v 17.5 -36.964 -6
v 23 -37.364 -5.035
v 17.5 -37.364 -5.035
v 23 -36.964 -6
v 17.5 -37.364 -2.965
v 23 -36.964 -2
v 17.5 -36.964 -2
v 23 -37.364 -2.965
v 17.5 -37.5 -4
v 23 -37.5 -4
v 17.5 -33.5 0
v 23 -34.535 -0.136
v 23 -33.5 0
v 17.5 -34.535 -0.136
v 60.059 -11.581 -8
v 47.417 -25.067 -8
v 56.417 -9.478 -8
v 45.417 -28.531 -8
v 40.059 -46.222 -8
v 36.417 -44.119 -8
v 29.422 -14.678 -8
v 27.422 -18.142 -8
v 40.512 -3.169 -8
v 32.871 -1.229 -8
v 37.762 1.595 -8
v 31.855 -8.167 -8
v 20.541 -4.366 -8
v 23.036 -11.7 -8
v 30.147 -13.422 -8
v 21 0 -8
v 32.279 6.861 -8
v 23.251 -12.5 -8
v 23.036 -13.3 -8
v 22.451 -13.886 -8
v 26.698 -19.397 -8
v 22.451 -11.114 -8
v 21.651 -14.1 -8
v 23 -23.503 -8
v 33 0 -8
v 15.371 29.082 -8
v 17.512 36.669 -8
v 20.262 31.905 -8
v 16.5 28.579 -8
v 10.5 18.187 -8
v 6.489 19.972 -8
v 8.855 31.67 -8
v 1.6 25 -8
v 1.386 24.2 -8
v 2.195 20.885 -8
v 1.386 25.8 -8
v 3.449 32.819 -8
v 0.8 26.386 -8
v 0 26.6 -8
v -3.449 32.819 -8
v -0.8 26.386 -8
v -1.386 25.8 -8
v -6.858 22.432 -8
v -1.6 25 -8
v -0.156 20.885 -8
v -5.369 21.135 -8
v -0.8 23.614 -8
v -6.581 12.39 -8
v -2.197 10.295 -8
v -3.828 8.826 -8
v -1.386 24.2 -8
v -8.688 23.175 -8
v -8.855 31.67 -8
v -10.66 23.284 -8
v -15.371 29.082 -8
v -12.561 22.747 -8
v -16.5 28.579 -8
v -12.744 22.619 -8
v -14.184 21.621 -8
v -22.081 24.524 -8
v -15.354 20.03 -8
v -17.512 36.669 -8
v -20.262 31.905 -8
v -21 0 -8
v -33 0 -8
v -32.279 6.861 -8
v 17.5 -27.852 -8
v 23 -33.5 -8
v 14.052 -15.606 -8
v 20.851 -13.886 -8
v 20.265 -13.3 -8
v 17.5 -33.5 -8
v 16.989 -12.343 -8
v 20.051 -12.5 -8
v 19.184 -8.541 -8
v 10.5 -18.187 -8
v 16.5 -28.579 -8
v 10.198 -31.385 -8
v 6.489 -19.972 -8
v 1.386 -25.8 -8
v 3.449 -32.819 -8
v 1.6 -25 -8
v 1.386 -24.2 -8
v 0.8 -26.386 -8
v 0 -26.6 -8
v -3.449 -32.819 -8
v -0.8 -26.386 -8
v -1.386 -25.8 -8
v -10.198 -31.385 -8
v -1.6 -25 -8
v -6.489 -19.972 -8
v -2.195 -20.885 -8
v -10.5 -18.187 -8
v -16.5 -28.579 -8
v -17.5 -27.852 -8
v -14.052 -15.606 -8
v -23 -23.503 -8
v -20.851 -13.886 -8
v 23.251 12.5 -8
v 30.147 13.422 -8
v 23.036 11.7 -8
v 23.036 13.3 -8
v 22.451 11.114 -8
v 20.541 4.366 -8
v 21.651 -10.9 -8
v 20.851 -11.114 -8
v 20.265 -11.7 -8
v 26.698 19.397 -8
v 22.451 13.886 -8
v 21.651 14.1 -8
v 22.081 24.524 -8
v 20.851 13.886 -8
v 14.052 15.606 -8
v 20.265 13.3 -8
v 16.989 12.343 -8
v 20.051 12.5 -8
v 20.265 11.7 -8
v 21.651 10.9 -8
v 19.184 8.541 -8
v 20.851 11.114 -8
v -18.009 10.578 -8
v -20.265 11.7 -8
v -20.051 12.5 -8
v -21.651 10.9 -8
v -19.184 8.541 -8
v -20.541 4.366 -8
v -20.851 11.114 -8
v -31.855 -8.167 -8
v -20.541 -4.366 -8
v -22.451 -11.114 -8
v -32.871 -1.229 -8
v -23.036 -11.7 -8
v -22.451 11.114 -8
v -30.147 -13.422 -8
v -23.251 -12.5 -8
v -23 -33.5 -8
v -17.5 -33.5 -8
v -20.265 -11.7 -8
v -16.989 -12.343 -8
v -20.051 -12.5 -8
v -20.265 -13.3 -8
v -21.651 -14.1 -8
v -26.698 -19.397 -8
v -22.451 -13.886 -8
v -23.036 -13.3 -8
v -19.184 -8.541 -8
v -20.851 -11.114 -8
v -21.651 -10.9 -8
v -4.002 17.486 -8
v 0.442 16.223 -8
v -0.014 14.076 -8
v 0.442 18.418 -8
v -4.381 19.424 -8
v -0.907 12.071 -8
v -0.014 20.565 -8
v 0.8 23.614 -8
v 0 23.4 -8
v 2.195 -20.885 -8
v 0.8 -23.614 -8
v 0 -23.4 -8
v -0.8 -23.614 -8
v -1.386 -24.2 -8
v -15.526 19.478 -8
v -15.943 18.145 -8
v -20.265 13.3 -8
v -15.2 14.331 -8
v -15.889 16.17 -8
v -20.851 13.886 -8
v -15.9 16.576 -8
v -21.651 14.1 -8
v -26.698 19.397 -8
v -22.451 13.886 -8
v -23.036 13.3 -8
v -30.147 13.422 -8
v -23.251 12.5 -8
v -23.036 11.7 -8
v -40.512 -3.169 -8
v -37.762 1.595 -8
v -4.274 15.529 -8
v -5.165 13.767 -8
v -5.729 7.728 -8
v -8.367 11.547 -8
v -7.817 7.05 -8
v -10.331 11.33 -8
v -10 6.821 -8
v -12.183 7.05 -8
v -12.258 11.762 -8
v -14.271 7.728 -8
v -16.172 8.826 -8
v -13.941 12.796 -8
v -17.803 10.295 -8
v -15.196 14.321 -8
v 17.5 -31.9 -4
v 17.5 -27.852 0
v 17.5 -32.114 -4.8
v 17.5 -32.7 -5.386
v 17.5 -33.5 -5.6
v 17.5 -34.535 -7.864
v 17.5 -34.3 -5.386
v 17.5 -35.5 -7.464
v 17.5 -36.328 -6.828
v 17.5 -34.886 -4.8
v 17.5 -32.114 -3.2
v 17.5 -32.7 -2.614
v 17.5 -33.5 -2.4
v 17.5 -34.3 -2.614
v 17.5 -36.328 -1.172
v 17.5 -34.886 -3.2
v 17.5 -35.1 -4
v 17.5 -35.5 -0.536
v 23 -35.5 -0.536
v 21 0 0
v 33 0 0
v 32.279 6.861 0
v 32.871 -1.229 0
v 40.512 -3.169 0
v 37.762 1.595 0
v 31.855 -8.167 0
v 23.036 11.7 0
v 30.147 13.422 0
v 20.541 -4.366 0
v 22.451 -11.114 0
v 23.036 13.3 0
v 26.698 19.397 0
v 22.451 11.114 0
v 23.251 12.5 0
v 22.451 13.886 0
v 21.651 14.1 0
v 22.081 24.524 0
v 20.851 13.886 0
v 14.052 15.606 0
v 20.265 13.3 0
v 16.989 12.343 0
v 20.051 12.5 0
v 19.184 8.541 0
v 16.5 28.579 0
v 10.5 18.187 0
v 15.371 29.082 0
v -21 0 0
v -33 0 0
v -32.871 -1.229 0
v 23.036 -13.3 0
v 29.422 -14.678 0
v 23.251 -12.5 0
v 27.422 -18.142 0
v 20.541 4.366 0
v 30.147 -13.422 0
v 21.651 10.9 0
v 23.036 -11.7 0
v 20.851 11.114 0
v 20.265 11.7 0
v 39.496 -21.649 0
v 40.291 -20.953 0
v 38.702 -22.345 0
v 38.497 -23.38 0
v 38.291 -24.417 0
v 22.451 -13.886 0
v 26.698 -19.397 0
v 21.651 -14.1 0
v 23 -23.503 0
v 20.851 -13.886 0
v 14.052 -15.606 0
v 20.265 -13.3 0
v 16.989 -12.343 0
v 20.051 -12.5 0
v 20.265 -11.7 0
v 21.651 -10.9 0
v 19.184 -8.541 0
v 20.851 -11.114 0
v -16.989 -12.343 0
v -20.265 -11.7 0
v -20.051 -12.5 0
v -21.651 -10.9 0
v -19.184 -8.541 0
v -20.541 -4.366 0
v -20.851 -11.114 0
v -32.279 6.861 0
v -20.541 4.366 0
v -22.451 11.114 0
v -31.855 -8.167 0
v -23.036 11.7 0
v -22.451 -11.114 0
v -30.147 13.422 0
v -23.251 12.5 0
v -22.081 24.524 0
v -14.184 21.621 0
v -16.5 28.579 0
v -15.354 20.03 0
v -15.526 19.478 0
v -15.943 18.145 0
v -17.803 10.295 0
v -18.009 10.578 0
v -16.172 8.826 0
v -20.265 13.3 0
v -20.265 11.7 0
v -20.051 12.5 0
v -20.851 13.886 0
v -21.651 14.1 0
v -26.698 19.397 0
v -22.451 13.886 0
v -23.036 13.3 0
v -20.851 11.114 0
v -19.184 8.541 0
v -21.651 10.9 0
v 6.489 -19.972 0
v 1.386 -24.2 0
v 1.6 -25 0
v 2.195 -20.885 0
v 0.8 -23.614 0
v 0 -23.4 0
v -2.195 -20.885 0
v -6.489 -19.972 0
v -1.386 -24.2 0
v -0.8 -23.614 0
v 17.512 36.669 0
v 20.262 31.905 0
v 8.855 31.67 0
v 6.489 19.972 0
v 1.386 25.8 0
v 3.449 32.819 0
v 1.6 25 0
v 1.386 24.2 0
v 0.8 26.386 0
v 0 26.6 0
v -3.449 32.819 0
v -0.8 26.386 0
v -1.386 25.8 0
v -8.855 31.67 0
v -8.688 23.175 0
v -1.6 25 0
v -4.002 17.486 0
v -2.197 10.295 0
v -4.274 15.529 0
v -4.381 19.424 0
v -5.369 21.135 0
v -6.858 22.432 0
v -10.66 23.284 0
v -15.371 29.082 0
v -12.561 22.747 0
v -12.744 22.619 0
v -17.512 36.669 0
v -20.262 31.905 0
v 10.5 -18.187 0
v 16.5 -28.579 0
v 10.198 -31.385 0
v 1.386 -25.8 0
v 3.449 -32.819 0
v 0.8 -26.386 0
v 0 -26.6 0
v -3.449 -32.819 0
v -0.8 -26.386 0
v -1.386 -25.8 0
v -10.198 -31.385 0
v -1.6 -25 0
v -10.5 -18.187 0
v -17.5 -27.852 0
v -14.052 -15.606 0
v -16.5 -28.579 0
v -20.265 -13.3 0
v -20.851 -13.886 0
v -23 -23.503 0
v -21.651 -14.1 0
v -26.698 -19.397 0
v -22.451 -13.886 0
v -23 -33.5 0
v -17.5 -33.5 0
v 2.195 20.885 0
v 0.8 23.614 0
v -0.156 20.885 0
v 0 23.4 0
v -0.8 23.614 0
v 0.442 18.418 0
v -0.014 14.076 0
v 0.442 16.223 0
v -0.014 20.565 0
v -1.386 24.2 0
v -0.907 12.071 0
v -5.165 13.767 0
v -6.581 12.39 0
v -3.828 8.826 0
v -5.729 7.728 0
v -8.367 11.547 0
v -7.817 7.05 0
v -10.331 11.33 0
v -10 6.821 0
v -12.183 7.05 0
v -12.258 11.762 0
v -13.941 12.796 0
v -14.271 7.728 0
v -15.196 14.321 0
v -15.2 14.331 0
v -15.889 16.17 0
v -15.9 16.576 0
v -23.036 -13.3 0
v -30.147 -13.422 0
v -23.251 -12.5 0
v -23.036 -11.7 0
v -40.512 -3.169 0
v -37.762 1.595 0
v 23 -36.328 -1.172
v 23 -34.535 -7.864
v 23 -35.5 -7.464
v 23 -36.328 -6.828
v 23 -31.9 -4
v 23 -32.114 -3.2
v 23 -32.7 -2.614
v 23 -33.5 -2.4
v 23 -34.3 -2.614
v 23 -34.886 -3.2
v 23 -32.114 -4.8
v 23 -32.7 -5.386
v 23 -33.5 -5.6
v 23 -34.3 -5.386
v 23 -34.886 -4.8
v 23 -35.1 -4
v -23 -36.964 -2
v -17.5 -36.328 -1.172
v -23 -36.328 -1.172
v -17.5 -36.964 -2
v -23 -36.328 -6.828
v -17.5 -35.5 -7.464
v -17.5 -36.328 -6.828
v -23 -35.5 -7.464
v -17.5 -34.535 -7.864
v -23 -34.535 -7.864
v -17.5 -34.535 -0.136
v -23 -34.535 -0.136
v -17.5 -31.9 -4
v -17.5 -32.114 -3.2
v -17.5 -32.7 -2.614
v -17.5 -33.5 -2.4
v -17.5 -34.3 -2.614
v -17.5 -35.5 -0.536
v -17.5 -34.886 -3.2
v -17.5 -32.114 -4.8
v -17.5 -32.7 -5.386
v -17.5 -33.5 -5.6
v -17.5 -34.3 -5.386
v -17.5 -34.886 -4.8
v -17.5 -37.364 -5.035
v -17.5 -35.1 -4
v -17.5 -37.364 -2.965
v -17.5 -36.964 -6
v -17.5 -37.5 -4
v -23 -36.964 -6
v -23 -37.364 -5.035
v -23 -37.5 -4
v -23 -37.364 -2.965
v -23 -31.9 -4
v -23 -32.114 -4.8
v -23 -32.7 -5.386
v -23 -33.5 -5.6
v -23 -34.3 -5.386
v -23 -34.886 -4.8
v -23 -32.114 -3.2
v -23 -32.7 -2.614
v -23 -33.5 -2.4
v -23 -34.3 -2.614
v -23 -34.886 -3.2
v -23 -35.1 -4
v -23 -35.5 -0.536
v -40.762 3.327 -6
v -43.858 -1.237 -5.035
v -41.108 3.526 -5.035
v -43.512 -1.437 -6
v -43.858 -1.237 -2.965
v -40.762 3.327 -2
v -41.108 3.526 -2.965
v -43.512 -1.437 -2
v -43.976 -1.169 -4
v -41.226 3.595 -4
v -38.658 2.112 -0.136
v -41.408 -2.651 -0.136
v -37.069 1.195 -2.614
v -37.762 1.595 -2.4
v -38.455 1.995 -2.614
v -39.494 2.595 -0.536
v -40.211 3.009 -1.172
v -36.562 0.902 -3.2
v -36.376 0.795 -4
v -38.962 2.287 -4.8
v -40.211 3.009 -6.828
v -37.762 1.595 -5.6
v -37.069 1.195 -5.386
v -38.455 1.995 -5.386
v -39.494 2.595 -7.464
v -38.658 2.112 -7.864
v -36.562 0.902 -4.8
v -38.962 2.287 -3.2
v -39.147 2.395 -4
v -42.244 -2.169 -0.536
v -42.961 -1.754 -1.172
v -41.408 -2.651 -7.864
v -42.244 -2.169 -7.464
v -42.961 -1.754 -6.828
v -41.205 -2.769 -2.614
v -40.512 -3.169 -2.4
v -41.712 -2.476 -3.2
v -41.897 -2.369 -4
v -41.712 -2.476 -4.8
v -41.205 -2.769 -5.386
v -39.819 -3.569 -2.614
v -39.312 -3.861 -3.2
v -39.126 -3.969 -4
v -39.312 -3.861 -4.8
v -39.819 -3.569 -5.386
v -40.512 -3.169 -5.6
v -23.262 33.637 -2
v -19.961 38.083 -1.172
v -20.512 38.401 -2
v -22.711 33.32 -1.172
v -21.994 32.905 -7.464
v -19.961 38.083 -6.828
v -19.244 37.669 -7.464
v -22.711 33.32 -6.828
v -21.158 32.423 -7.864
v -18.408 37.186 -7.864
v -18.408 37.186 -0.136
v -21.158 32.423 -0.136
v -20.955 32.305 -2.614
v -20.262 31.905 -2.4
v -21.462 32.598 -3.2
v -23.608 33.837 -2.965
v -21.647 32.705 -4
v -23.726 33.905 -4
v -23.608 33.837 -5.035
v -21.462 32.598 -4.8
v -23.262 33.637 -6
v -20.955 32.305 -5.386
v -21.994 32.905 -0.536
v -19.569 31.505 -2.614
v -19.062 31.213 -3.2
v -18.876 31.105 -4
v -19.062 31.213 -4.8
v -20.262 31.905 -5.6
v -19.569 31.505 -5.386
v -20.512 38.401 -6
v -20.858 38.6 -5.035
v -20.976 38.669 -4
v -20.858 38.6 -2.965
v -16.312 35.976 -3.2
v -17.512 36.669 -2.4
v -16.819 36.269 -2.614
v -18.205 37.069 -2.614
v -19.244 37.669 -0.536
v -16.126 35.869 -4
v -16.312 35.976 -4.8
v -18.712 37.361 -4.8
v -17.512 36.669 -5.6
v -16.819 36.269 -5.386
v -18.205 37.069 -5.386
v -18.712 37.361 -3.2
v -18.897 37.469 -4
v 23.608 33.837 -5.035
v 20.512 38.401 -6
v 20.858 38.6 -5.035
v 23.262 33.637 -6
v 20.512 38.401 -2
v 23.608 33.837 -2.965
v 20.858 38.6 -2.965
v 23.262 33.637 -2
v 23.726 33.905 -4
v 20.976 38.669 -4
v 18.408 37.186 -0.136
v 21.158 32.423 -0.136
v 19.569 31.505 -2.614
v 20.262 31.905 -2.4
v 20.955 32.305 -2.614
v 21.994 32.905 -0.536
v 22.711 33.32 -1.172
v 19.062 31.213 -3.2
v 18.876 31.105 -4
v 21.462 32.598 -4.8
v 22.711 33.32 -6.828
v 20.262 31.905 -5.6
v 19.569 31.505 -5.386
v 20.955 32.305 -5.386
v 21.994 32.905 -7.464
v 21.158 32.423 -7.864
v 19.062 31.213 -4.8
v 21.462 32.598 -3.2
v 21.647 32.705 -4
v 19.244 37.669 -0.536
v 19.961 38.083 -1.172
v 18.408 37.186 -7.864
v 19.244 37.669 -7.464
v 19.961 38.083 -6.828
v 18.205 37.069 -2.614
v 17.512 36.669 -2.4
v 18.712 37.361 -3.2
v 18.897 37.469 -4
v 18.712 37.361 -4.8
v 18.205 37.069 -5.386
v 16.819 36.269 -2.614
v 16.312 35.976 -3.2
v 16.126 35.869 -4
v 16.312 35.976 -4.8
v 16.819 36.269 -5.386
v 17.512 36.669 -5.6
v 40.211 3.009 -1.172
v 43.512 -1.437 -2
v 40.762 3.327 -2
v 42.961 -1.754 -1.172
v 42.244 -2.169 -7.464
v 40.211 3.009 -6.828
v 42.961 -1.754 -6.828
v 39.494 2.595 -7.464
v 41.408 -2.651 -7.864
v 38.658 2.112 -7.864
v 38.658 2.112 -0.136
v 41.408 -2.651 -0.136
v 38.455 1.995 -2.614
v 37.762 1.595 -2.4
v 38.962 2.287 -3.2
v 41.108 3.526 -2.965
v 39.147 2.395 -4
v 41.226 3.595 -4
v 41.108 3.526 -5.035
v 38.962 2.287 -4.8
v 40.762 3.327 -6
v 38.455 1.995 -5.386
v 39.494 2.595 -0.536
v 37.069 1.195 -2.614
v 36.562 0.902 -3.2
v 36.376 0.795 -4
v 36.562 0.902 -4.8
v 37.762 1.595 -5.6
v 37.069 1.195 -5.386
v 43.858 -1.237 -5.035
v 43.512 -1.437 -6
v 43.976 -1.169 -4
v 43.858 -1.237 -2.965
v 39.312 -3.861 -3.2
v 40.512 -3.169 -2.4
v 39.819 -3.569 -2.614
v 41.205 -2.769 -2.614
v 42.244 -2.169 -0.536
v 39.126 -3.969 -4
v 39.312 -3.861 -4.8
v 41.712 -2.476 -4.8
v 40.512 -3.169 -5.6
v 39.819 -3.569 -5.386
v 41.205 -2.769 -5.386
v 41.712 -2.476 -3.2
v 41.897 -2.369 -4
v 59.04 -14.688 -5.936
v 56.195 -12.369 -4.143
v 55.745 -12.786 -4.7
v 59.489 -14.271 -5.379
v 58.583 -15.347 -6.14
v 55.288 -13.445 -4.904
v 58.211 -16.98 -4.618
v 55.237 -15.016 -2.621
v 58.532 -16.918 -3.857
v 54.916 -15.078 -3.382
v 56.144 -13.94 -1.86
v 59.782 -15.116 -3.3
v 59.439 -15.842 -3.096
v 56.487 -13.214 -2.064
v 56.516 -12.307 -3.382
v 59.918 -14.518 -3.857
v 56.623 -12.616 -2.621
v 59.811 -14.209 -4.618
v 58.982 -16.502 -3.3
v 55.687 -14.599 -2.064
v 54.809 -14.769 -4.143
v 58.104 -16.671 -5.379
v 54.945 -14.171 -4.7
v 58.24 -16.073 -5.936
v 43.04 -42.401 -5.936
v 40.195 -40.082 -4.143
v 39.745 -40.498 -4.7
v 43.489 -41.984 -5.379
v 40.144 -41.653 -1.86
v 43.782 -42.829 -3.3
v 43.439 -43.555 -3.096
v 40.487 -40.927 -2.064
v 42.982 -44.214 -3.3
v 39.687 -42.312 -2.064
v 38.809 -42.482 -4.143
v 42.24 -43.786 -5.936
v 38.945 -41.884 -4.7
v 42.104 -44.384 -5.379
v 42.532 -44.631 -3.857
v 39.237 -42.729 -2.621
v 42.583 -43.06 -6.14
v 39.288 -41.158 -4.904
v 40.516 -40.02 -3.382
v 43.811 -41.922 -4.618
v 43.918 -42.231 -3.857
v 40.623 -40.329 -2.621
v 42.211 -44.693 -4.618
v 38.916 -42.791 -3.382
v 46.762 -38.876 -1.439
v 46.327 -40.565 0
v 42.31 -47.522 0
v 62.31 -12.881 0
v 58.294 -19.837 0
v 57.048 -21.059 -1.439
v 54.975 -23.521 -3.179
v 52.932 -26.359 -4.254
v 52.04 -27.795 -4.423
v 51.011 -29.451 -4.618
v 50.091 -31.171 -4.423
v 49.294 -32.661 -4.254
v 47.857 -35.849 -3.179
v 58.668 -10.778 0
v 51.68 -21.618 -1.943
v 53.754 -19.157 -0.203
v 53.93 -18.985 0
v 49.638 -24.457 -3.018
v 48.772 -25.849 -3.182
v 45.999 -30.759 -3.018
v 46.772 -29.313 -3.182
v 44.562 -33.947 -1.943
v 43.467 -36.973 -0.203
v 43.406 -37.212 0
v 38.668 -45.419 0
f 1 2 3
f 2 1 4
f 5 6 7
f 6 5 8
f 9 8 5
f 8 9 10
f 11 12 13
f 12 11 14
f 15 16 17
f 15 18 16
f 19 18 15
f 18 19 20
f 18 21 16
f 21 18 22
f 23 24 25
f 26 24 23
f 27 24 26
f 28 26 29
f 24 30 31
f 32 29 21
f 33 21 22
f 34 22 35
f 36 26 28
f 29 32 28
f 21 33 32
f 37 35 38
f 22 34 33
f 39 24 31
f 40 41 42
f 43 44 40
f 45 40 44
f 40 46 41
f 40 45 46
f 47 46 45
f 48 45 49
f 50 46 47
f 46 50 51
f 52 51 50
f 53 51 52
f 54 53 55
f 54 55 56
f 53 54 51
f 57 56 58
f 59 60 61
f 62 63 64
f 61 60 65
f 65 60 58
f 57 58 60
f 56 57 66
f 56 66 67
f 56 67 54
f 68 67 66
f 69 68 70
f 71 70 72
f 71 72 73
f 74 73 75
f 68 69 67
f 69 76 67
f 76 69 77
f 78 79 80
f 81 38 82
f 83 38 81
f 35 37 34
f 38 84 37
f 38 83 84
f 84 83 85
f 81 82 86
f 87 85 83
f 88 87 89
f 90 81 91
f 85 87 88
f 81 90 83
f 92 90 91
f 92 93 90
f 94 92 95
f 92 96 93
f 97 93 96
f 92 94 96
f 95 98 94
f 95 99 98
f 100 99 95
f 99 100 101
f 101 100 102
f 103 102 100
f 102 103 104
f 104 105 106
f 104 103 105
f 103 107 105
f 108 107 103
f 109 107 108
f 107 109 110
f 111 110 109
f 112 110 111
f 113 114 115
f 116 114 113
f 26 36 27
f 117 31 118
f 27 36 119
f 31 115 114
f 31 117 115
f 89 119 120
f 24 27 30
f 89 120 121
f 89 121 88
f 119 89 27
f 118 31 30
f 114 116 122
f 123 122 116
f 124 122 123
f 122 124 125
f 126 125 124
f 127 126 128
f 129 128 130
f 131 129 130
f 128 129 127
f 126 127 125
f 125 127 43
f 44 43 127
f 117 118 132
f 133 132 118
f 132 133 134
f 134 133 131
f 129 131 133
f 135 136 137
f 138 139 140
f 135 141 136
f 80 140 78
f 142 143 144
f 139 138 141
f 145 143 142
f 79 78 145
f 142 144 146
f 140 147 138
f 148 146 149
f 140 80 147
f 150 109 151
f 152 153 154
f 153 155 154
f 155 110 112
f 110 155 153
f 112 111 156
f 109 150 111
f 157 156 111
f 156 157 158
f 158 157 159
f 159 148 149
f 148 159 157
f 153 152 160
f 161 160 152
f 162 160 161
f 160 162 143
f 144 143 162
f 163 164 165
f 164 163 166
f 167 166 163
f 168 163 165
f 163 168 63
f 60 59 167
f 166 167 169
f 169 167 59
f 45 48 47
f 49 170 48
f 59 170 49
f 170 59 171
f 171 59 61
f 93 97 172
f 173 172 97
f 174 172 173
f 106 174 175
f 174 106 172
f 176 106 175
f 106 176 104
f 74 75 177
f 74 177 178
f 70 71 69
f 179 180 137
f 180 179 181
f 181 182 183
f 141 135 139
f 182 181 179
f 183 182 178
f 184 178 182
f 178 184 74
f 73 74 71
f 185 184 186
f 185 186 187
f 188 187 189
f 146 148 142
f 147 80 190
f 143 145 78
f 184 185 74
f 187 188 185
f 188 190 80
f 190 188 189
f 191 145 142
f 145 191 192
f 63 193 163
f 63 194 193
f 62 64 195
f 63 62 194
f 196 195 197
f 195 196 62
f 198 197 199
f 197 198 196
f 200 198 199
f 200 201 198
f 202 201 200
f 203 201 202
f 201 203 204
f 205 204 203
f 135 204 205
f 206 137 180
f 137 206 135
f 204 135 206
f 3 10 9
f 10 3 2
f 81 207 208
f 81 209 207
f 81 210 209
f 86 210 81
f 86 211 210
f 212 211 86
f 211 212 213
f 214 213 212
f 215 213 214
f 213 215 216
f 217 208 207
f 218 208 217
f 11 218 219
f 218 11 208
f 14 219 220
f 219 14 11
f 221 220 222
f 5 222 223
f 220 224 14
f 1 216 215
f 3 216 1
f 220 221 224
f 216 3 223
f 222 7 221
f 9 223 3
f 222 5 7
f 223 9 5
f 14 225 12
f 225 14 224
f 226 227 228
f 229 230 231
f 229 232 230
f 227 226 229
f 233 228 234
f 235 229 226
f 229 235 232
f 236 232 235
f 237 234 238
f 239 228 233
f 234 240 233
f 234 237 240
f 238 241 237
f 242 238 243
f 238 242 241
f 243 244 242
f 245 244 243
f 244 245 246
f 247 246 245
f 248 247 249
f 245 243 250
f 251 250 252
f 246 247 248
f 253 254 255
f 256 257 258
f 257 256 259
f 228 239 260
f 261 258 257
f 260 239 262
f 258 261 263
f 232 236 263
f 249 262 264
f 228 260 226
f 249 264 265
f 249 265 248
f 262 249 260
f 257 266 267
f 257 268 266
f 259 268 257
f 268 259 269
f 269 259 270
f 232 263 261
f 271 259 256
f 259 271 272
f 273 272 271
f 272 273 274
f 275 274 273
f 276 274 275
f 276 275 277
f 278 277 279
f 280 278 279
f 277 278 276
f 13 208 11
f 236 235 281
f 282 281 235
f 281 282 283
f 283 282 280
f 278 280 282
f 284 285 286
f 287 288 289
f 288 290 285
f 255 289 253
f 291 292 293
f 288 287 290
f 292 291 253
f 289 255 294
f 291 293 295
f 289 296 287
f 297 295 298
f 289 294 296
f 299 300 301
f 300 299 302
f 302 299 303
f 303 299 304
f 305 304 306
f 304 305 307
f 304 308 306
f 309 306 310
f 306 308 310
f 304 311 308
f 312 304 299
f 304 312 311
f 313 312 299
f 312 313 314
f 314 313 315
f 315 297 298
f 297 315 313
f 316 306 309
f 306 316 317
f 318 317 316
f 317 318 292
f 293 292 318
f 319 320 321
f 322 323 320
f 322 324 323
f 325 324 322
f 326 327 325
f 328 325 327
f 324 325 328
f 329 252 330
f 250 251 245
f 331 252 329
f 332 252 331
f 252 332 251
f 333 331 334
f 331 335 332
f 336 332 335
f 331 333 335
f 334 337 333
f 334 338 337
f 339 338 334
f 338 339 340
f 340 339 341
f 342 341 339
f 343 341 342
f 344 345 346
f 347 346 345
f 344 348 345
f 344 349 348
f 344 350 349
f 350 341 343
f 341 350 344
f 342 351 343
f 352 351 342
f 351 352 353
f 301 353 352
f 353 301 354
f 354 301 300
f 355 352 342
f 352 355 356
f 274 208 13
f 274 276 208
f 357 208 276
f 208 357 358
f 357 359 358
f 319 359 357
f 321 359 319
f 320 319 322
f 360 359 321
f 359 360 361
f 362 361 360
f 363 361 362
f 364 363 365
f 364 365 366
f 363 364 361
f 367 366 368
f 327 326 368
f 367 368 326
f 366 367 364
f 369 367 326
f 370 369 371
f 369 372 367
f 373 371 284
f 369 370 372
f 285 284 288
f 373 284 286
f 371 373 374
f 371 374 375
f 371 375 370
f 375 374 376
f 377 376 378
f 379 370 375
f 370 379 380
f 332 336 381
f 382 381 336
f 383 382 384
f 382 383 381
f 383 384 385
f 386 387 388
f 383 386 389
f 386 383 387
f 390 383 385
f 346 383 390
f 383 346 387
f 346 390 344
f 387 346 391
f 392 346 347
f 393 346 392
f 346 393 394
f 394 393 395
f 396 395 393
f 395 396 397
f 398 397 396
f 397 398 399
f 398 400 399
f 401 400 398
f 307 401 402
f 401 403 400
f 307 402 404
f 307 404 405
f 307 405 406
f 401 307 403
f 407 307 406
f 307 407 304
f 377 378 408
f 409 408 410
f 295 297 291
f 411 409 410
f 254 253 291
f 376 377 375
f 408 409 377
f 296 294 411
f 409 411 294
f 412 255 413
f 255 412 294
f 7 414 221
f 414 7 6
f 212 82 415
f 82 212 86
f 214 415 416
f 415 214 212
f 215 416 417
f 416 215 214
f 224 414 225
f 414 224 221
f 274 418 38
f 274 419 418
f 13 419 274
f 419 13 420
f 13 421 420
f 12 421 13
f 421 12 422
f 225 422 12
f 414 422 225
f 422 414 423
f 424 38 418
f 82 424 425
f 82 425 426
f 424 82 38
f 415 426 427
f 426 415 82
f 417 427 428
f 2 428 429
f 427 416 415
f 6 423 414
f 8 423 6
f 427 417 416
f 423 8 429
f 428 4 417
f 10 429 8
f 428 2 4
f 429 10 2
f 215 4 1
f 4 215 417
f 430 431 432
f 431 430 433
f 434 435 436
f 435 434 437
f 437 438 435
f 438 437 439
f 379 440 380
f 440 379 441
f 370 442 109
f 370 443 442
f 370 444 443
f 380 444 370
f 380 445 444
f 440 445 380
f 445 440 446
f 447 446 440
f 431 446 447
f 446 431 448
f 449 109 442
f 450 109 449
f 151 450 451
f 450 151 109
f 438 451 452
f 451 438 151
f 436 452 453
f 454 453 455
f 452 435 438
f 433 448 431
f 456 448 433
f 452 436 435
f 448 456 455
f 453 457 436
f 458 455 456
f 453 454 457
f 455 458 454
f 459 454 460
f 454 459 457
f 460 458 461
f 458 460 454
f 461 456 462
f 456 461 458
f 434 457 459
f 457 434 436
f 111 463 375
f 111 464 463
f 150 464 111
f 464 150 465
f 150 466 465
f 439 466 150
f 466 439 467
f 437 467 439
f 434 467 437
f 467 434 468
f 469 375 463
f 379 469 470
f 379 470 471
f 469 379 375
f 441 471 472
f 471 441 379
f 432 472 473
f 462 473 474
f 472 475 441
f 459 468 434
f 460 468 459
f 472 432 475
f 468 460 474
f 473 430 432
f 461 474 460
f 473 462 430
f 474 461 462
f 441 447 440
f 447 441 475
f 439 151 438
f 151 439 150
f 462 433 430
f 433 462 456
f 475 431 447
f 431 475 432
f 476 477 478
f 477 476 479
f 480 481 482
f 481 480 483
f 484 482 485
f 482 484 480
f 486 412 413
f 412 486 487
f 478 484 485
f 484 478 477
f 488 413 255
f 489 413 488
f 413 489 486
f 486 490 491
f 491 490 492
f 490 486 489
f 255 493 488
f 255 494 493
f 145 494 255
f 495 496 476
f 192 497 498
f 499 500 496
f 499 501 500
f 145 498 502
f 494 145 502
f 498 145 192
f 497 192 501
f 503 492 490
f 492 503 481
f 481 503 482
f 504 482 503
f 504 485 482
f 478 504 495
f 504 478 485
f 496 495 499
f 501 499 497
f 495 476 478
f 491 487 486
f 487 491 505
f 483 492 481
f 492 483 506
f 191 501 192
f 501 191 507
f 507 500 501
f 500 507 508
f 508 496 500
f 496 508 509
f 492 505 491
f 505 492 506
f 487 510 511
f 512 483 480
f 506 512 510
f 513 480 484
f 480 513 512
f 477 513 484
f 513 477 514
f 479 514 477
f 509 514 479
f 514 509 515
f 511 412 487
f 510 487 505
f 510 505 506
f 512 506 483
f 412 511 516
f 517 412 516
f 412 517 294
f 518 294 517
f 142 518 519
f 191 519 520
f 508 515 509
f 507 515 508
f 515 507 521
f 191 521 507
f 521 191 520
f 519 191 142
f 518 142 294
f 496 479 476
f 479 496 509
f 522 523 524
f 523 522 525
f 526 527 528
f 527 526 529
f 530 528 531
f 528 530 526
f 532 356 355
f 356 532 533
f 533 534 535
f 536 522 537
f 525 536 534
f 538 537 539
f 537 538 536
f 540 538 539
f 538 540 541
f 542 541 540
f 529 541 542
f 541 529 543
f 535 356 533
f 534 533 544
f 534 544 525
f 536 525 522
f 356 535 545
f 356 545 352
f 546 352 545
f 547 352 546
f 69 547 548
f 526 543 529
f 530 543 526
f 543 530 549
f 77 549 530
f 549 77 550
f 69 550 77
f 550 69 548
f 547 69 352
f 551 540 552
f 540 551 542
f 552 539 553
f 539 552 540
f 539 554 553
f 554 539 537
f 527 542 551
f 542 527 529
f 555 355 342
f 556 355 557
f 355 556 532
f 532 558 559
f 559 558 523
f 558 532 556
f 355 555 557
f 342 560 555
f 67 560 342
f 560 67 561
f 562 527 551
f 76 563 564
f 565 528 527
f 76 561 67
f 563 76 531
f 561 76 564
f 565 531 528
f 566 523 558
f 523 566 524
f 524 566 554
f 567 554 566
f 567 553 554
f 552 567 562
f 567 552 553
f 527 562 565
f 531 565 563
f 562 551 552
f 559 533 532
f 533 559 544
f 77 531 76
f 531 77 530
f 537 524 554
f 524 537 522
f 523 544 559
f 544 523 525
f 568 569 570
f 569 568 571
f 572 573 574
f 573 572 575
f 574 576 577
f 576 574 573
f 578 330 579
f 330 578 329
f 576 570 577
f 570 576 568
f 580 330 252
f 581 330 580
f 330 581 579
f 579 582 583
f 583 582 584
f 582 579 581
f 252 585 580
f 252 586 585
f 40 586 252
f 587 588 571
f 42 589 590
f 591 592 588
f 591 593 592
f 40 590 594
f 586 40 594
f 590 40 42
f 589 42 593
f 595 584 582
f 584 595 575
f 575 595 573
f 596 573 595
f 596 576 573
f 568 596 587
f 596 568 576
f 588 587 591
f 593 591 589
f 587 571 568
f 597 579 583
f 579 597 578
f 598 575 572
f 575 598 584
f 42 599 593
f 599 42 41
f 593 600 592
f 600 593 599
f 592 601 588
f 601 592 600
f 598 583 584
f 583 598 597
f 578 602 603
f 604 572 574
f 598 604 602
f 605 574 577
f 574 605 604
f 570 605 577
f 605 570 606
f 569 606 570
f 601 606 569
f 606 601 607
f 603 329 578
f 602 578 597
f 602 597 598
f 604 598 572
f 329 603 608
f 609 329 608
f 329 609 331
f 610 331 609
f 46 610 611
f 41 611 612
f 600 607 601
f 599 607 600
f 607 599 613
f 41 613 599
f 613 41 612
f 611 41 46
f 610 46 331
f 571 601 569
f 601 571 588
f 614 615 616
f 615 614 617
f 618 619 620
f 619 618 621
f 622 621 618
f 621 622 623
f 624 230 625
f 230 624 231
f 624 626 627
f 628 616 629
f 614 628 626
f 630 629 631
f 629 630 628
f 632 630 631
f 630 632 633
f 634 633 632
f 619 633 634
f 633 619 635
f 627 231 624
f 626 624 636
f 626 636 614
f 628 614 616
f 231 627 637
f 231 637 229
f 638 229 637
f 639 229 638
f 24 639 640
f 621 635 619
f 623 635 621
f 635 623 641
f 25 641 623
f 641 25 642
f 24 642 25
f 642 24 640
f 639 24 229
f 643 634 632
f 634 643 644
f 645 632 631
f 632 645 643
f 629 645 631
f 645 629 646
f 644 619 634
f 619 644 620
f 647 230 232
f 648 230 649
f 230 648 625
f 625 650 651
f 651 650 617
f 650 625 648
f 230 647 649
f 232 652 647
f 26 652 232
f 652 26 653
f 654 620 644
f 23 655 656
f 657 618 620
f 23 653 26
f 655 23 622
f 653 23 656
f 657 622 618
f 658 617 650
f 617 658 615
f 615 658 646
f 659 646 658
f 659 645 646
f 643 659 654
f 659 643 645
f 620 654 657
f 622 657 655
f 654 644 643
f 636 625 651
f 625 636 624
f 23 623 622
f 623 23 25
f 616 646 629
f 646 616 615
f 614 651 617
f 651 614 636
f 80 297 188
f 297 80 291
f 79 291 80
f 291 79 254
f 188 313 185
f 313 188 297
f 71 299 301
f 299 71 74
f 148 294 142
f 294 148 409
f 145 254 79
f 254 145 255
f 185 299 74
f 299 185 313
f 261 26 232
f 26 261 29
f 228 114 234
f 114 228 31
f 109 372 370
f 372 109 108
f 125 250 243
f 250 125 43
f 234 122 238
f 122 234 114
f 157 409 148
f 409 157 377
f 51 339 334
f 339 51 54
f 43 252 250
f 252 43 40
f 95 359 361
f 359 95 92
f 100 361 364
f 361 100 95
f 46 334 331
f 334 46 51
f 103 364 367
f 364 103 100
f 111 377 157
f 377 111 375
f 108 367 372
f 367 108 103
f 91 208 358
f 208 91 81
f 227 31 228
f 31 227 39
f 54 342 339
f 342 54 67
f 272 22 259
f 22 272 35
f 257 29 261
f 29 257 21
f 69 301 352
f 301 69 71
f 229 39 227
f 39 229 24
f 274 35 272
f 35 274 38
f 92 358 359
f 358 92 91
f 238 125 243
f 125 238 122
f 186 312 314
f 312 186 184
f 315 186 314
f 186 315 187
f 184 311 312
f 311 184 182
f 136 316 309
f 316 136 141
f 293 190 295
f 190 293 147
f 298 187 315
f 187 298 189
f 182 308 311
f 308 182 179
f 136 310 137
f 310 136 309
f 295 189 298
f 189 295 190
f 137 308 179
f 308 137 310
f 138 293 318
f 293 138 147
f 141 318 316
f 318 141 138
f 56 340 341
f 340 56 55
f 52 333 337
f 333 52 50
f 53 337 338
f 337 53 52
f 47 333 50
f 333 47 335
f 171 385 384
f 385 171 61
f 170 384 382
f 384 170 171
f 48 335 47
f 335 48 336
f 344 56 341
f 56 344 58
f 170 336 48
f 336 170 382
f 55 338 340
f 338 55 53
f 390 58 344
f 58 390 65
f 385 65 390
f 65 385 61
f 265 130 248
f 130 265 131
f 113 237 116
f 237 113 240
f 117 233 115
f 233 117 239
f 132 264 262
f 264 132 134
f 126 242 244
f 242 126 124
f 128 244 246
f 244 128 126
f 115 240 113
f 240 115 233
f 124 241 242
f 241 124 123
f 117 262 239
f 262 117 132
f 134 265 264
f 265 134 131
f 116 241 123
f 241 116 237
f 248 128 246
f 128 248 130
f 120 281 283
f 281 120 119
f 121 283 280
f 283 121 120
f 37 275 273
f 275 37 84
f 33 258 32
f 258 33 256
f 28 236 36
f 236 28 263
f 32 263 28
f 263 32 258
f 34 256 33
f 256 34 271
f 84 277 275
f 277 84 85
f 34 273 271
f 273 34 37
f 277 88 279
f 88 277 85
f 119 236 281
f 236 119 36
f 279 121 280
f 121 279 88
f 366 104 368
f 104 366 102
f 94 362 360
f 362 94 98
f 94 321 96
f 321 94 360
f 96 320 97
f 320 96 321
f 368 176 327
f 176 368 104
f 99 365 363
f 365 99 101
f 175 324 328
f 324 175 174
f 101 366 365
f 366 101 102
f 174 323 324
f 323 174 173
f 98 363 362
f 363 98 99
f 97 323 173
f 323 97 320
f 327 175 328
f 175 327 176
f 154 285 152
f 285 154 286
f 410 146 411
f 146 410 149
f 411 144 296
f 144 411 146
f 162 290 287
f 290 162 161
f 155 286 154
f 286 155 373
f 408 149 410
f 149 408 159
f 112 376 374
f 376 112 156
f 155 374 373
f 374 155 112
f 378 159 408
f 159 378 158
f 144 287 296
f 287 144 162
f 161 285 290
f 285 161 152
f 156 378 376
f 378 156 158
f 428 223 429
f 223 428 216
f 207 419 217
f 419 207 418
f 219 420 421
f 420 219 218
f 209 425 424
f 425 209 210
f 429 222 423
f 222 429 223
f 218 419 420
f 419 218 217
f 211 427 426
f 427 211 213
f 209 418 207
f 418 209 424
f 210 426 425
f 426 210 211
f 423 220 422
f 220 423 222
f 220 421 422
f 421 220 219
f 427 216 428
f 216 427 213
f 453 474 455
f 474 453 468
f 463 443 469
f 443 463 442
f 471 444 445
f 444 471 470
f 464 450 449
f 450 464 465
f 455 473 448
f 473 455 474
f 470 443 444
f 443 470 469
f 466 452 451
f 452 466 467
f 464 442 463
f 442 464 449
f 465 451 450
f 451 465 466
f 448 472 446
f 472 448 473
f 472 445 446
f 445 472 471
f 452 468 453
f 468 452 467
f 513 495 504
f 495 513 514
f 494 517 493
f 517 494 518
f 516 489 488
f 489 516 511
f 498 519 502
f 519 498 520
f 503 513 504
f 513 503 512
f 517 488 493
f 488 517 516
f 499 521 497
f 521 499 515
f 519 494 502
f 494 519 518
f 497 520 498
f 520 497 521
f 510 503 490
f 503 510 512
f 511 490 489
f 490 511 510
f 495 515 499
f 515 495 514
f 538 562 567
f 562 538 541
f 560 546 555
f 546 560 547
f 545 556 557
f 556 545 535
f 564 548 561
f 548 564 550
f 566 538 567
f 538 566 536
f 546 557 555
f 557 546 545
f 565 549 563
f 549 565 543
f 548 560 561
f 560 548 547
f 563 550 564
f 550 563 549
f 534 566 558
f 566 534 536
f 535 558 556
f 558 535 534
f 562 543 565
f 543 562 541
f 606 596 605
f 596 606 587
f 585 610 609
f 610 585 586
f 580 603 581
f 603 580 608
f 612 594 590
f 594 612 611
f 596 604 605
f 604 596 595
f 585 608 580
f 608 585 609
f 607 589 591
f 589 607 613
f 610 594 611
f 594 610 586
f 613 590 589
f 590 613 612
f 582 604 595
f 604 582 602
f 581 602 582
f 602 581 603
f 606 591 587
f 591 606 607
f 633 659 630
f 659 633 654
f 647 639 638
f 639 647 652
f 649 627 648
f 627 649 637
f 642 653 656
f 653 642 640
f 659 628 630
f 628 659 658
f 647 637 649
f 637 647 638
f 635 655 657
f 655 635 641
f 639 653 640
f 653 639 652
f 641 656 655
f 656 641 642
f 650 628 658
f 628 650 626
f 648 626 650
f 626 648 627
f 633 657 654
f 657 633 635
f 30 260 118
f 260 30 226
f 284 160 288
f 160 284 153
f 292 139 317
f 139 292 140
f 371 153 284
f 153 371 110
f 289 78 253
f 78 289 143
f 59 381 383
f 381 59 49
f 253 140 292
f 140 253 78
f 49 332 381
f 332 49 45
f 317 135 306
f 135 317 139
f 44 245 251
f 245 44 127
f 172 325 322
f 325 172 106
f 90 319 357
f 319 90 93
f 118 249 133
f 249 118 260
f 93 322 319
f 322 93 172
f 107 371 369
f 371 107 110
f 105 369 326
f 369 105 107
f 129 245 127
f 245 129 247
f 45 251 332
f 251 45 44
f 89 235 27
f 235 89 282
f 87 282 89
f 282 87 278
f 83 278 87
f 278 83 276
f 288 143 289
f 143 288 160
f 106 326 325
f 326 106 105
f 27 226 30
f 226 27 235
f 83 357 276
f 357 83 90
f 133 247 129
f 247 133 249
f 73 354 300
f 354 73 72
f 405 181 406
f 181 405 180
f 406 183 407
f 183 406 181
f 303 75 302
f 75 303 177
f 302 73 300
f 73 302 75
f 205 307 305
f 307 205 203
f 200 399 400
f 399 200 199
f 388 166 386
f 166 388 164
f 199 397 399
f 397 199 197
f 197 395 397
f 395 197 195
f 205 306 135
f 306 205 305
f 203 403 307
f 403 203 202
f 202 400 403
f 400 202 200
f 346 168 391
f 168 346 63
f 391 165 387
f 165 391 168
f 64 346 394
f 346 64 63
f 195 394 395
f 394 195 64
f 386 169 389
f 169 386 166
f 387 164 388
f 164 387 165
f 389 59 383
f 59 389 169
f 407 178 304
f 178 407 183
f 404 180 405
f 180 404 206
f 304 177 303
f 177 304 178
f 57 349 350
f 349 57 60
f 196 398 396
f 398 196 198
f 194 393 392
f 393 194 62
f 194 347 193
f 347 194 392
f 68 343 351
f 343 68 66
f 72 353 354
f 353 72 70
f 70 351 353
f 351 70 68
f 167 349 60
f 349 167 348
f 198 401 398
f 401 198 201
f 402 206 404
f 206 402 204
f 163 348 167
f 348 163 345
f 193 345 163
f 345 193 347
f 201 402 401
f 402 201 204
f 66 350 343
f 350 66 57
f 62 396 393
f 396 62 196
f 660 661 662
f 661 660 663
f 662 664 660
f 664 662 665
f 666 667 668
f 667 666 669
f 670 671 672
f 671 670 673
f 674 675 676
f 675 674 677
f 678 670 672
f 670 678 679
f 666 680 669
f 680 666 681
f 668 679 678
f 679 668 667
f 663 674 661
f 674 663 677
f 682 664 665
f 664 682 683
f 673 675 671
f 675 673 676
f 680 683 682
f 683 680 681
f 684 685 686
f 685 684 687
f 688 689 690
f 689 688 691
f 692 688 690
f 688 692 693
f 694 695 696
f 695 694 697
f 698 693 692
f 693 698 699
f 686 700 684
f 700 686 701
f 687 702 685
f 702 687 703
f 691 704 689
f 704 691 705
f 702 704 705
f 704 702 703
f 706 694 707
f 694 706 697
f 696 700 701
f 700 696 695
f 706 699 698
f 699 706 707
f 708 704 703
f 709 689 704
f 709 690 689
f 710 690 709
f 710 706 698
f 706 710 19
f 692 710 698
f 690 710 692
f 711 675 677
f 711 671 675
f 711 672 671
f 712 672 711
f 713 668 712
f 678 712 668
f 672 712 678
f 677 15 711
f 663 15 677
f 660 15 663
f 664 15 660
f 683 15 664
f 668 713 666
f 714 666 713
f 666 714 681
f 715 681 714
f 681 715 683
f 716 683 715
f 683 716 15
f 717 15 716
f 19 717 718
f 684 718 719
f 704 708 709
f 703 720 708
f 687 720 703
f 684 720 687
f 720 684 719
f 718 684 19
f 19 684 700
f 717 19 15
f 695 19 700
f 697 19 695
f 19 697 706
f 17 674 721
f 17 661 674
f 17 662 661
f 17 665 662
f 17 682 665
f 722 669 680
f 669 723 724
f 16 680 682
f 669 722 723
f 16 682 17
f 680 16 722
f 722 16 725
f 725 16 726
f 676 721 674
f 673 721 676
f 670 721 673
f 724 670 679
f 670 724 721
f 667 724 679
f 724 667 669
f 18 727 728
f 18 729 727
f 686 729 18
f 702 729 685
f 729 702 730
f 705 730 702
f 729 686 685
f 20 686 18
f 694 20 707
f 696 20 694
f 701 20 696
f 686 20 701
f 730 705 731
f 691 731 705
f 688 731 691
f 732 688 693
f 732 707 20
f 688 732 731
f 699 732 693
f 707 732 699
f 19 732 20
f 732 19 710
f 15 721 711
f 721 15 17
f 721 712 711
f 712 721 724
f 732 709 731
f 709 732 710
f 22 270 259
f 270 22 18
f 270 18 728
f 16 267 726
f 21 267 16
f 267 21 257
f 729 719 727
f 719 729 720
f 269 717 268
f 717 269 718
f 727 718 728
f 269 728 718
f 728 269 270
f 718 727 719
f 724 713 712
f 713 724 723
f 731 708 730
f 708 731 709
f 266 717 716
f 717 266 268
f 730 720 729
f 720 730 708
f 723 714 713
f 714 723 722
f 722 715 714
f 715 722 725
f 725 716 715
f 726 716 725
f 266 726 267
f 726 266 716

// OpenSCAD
thickness = 8;
hole_radius = 50/2;
probe_radius = 13/2;
delta_effector_offset = 33.5;
mount_spacing = 46;
mount_width = 5.5;
fan_mount_length = 28;
fan_mount_width = 4;
fan_size = 40;
fan_blade_radius = 35/2;
fan_hole_spacing = 32;
fan_hole_radius = 3.2/2;

module effector() {
  difference() {

    union() {
      // main ring - intentionally thicker to be closer to original
      cylinder(r = hole_radius+thickness, h = thickness);

      // arm mounting points
      for (n=[0:2]) {
        rotate([0,0,n*120]) {
          for (i=[-1,1]) {
            hull() {
              for (j=[0.5,1]) {
                translate([i*(mount_spacing-mount_width)/2,-j*delta_effector_offset,thickness/2]) {
                  rotate([0,90,0]) {
                    cylinder(r = thickness/2, h = mount_width,
                      center = true, $fn = 24);
                  }
                }
              }
            }
          }
        }
      }
    }

    // center hole
    translate([0,0,-1/2]) {
      cylinder(r = hole_radius-thickness/2, h = thickness+1);
    }

    // mount holes
    for(n = [0:5]) {
      rotate([0,0,30+n*60]) {
        translate([hole_radius,0,-1/2]) {
          cylinder(r = 3.2/2, h = thickness+1, $fn = 12);
        }
      }
    }

    // probe hole
    rotate([0,0,-30]) {
      translate([0,20,-50/2]) {
        cylinder(r = 12/2, h = thickness+50);
      }
    }

    // arm mounting holes
    for (n=[0:2]) {
      rotate([0,0,n*120]) {
        for (i=[-1,1]) {
          translate([i*(mount_spacing-mount_width)/2,-delta_effector_offset,
              thickness/2]) {
            rotate([0,90,0]) {
              cylinder(r = 3.2/2, h = mount_width*2, center = true, $fn = 12);
            }
          }
        }
      }
    }
  }

  // probe mounting
  rotate([0,0,-30]) {
    translate([0,20,0]) {
      difference() {
        cylinder(r = probe_radius+thickness/2, h = thickness);
        translate([0,0,-1]) cylinder(r = 12/2, h = thickness+2);
      }
    }
  }

  // fan mount
  rotate([0,0,-150]) {
    translate([fan_mount_length+hole_radius+thickness/2,
        0, thickness/2]) {
      difference() {
        union() {
          translate([-fan_mount_length/2, 0, 0]) {
            cube([fan_mount_length, fan_mount_width, thickness],
              center = true);
          }
          intersection() {
            rotate([0,-18,0]) {
              difference() {
                cube([fan_mount_width, fan_size, thickness*2], center = true);
                for (i=[-1,1]) {
                  translate([0, i*fan_hole_spacing/2, 0]) {
                    rotate([0,90,0]) {
                      cylinder(r=fan_hole_radius, h = fan_mount_width*2,
                        center = true, $fn = 12);
                    }
                  }
                }
              }
            }
            cube([fan_size*2,fan_size*2, thickness], center = true);
          }
        }
        rotate([0,-18,0]) {
          translate([0,0,-fan_blade_radius]) {
            rotate([0,90,0]) {
              cylinder(r=fan_blade_radius, h = fan_mount_length*2,
                center = true);
            }
          }
        }
      }
    }
  }
}

module old_effector() {
  translate([-10,-5,0]) import("Cerberus/platform.STL");
}

rotate([0, 180, 0]) effector();
//translate([0,0,thickness])
//%old_effector();
